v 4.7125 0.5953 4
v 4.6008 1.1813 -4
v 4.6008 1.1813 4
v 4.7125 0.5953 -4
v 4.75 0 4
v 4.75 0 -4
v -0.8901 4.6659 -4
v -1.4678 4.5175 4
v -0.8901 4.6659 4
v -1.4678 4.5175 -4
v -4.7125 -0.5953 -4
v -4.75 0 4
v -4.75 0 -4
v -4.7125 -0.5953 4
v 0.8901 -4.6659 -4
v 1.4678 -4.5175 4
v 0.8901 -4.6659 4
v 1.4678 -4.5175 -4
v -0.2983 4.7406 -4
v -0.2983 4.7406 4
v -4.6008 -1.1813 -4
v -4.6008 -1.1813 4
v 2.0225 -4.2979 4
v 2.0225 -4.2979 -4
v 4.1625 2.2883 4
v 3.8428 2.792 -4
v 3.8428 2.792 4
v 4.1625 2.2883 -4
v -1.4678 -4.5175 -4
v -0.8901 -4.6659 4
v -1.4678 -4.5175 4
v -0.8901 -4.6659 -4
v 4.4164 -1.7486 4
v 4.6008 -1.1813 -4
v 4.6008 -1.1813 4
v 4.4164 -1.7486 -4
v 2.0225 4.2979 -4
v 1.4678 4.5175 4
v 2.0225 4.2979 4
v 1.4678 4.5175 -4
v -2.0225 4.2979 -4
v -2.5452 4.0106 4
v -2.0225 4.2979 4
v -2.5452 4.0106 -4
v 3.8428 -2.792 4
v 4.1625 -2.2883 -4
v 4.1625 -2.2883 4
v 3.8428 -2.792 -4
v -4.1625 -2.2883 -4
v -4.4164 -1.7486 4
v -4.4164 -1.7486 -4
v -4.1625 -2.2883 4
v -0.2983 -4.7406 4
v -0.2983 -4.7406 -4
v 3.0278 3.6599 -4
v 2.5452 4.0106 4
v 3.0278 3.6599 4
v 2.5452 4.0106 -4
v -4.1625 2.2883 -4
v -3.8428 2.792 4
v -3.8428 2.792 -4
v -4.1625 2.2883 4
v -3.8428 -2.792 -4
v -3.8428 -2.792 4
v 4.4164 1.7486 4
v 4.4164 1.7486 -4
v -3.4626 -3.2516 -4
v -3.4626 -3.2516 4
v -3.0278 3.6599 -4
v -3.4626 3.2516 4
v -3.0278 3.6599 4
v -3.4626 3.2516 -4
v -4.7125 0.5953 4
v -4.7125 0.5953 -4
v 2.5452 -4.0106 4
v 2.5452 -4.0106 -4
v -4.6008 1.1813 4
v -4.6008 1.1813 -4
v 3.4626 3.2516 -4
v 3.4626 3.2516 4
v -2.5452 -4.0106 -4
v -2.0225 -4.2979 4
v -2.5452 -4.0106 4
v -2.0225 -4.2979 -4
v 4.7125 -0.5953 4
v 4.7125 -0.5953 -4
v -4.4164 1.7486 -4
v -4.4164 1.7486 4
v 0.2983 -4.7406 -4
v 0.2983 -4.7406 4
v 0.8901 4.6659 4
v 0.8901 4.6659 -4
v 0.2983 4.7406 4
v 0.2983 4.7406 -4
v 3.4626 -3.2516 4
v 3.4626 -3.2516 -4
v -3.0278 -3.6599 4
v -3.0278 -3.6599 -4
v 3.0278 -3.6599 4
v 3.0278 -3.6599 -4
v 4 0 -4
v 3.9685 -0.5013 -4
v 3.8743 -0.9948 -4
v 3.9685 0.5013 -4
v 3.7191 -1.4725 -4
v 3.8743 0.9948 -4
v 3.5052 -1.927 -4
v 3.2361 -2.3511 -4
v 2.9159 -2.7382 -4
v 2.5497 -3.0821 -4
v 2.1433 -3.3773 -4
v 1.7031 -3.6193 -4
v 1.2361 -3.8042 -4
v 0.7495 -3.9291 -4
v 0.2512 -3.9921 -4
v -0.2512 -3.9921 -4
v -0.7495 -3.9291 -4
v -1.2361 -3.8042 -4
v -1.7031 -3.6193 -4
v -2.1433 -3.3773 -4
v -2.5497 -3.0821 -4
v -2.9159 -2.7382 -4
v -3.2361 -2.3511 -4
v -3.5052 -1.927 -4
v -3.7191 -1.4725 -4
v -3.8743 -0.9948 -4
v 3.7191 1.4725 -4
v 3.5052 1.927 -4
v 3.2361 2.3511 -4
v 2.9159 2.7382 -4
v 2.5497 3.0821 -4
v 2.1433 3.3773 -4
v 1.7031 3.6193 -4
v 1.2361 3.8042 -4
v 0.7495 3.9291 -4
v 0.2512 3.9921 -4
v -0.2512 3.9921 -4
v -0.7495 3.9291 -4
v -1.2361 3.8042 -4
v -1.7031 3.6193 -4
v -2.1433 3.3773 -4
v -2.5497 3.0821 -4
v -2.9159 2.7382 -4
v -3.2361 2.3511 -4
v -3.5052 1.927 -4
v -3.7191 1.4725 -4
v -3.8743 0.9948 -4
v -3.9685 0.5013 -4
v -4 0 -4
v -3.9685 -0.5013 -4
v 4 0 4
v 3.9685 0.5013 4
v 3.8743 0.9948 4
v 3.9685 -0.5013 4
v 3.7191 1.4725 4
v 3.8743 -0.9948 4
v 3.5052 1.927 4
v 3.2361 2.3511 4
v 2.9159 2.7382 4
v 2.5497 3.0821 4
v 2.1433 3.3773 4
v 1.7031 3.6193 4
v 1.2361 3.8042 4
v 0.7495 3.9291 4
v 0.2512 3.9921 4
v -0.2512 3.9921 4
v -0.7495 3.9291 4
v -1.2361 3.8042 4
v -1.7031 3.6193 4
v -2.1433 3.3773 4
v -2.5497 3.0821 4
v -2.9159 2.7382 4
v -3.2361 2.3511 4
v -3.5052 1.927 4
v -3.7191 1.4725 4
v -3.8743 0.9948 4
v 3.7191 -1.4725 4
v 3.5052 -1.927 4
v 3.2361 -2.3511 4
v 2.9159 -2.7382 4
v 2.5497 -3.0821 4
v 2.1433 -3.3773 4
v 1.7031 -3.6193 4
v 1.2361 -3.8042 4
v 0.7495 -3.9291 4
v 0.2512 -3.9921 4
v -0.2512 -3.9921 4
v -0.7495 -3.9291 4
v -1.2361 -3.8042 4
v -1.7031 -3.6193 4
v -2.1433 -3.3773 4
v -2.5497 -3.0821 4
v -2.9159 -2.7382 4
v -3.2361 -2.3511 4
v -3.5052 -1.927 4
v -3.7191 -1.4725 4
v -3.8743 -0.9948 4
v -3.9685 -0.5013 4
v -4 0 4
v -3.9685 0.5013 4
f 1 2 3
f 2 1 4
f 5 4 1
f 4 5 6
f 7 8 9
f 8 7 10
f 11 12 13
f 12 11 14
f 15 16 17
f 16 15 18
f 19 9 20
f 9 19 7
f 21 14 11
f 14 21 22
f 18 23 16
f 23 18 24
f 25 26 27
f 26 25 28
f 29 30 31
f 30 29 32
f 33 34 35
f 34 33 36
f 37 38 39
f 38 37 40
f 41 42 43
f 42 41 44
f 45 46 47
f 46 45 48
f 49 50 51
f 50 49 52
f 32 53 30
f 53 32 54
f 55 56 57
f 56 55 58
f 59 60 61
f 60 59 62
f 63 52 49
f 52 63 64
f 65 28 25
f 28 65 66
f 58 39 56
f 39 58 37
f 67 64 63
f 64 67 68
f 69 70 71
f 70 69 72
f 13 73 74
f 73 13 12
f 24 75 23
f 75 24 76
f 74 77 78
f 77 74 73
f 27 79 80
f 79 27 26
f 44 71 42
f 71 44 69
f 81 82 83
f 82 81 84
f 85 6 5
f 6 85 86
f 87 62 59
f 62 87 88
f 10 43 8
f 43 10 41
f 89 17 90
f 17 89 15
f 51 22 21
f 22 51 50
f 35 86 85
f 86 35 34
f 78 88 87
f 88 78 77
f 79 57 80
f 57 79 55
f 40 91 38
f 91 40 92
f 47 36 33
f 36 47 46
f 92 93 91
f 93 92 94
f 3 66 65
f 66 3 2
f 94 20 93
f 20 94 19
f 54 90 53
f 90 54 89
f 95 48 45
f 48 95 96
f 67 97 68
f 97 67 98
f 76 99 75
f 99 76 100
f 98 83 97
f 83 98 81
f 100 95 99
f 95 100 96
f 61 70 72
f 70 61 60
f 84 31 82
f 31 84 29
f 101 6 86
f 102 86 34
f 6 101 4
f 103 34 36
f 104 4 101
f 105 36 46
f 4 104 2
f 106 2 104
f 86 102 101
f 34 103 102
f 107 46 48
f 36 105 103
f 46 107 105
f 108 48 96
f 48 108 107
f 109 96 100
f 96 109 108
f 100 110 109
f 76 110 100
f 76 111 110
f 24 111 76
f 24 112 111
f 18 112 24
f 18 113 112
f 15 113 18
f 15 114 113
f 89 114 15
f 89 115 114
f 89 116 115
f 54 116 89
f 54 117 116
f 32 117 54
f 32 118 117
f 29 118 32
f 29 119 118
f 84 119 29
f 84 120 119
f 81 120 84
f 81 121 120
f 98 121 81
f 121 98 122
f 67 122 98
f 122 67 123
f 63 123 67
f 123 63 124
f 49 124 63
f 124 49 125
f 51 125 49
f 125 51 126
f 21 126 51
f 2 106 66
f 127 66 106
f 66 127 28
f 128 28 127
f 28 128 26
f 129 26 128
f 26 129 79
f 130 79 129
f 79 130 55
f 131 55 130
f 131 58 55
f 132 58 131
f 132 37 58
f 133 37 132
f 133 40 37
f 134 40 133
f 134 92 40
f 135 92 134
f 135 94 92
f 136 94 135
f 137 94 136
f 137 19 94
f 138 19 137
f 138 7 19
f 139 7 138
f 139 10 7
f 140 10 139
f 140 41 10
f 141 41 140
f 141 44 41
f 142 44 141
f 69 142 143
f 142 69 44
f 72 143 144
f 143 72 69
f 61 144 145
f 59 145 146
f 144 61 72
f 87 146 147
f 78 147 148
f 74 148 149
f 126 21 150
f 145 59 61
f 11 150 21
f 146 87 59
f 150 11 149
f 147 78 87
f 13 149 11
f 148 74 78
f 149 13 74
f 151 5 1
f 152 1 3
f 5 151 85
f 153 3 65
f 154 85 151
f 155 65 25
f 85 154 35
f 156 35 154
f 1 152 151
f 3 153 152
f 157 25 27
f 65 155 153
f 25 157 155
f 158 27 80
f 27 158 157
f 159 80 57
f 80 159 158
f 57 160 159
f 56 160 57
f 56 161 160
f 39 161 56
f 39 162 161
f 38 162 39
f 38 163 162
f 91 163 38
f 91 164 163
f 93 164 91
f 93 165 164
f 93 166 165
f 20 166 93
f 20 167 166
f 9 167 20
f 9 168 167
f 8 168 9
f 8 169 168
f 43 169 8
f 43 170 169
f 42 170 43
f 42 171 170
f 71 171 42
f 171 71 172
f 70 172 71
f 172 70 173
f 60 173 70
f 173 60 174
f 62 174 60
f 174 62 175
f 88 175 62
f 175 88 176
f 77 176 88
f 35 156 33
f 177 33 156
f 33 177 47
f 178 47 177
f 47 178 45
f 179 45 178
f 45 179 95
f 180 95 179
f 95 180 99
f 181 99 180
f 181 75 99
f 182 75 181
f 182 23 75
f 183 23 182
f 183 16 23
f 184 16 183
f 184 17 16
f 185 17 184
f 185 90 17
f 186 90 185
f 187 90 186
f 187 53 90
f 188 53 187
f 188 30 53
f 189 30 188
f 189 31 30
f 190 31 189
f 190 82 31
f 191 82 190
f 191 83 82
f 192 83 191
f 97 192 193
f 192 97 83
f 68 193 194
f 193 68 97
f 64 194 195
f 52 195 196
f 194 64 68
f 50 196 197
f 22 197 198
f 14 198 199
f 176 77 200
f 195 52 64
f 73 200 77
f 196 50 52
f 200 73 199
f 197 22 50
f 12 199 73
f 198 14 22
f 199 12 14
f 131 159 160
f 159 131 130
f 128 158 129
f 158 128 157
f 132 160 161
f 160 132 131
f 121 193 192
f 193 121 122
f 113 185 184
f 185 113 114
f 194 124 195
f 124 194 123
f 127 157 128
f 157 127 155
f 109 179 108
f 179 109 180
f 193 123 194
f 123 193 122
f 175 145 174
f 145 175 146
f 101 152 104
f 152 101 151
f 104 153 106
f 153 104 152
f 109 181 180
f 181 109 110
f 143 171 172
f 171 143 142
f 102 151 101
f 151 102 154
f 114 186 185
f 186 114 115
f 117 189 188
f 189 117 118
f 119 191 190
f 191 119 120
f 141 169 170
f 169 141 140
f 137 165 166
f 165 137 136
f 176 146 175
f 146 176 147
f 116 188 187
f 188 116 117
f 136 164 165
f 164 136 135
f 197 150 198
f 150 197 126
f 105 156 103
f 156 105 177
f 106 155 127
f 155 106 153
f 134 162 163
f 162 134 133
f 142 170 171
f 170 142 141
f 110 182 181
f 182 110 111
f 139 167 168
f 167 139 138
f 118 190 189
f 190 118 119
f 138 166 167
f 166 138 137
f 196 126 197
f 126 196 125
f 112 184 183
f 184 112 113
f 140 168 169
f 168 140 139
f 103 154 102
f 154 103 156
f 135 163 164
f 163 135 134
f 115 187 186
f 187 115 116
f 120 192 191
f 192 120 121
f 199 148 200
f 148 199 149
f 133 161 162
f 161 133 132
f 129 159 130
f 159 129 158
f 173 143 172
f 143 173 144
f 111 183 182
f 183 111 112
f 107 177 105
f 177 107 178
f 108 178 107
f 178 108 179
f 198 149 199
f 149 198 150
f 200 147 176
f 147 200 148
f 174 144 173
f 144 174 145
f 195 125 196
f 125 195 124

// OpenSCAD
$fn = 50;


difference() {
	union() {
		translate(v = [0, 0, -4.0000000000]) {
			cylinder(h = 8, r = 4.7500000000);
		}
	}
	union() {
		translate(v = [0, 0, -100.0000000000]) {
			cylinder(h = 200, r = 4.0000000000);
		}
	}
}
